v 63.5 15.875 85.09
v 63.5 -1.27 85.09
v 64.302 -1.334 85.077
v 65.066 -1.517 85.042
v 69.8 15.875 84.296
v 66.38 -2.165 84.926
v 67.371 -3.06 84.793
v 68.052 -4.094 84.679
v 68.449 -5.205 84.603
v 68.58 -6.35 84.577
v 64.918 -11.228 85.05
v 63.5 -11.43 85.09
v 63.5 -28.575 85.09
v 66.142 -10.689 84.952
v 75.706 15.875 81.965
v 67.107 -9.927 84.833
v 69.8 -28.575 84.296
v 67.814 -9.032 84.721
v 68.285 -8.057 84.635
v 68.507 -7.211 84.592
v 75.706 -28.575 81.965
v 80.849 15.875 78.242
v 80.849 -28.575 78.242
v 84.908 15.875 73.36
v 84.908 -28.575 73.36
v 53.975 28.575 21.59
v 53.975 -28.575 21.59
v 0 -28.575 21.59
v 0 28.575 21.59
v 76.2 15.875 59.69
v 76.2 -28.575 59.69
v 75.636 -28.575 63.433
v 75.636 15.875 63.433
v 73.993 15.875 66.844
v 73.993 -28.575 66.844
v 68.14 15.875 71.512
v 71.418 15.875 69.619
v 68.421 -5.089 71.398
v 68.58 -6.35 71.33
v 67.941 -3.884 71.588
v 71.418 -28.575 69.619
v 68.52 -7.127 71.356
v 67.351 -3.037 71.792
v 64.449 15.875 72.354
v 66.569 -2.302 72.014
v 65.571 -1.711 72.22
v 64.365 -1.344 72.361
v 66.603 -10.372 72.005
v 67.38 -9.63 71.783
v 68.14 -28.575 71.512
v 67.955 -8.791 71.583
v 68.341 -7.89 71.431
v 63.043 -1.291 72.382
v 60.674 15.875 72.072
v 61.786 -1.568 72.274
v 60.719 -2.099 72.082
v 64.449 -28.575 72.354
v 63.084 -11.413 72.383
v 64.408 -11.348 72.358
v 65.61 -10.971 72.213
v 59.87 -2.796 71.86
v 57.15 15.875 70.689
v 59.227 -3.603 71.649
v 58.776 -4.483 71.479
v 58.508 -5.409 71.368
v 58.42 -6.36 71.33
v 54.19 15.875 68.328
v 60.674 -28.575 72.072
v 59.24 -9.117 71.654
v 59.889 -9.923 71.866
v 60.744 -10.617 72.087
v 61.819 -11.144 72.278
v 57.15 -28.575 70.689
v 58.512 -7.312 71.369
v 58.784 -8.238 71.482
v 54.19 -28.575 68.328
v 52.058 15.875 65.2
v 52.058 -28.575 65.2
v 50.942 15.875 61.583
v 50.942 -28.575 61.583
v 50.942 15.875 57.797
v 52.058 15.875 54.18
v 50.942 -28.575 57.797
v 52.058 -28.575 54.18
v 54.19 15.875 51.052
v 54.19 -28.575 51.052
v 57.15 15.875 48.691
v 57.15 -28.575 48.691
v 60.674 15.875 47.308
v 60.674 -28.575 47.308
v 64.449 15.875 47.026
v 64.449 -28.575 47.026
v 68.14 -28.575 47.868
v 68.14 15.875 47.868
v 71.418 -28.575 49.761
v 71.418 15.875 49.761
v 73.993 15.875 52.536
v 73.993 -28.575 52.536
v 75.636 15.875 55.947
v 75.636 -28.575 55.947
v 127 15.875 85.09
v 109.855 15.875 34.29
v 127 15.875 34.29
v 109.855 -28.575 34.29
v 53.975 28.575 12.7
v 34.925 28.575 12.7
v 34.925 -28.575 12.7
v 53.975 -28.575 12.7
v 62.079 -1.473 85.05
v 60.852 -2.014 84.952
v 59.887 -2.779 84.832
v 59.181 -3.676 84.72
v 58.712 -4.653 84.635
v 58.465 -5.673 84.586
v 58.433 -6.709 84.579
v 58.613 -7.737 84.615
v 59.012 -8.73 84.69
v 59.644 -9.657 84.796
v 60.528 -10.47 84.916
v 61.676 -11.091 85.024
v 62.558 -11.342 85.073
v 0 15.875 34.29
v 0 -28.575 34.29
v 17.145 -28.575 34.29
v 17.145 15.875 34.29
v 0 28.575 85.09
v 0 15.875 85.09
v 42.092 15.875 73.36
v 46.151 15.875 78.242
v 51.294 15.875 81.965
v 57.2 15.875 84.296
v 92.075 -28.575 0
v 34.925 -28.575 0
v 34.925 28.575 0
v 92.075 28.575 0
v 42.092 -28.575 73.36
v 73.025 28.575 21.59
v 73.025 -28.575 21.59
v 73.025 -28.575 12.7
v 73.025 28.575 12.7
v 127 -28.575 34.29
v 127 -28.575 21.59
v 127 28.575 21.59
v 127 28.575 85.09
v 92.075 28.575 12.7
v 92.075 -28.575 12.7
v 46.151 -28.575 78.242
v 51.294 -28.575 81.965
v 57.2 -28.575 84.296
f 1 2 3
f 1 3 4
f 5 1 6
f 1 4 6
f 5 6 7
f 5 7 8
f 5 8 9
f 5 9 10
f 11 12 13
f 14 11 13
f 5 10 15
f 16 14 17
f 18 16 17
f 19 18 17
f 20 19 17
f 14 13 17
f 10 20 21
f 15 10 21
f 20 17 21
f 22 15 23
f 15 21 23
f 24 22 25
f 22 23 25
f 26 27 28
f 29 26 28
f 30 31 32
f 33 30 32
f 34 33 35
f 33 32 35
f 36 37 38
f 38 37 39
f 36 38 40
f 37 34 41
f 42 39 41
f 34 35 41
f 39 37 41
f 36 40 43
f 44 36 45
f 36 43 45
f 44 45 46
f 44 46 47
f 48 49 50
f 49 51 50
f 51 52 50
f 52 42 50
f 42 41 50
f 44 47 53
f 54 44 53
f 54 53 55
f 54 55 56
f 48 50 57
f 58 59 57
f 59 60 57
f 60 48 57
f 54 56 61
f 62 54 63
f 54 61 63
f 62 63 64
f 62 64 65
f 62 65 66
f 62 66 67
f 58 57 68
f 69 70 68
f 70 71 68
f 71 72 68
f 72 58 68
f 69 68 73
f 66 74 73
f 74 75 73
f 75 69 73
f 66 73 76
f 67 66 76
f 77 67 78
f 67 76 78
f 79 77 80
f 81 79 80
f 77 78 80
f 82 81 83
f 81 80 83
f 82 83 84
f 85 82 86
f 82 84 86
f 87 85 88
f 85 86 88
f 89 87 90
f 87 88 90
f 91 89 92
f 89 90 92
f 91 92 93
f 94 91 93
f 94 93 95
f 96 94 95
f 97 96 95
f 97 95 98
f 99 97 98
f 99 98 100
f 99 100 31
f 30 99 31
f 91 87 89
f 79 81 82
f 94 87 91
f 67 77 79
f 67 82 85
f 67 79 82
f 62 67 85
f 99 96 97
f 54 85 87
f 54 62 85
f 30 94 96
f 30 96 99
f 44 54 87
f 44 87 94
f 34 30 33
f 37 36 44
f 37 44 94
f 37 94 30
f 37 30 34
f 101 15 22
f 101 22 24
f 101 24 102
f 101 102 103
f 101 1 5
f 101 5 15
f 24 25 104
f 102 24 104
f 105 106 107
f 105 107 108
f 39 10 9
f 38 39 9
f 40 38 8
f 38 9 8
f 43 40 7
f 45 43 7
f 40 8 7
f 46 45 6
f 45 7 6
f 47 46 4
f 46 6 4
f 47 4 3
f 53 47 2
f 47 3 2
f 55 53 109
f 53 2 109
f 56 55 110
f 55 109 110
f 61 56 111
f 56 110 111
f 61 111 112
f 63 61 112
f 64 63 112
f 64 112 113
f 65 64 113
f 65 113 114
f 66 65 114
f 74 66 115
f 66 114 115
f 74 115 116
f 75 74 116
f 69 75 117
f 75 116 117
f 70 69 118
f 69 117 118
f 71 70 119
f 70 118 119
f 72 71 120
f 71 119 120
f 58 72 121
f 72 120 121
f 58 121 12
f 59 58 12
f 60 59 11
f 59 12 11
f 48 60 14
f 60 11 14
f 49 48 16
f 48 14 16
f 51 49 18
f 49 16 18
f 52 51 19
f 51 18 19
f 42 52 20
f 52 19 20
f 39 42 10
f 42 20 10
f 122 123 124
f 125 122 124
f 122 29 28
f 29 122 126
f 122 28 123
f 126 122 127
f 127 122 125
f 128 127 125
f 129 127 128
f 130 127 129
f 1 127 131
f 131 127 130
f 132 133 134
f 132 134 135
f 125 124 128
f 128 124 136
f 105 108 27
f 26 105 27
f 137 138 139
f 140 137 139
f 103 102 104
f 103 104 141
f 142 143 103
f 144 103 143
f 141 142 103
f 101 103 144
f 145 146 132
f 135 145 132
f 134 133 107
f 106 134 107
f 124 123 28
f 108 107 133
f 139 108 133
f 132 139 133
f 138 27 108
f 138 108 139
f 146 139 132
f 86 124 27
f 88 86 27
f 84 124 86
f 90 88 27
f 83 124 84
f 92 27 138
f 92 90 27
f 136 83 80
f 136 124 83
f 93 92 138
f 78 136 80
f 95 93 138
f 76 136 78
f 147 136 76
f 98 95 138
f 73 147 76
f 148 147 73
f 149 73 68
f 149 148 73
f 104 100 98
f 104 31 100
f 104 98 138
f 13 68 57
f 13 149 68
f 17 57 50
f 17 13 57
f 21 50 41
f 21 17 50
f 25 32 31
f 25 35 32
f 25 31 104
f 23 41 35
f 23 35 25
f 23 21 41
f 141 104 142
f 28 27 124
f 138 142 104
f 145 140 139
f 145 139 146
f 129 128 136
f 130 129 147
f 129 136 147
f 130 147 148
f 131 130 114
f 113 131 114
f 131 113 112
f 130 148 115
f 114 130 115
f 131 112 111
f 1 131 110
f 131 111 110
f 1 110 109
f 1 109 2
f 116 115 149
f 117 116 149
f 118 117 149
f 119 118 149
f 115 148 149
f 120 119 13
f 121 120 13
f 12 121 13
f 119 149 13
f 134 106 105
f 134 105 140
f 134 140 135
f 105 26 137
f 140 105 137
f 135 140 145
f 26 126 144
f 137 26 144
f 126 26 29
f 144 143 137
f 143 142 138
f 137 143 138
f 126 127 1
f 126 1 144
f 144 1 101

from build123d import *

# Parameters (mm, degrees)
F0_W     = 127
F0_H     = 85.09
F1_DEPTH = 28.575
F3_DEPTH = 57.151
F5_R     = 5.08
F6_DEPTH = 25.4
F4_R     = 12.7
F7_DEPTH = 44.45


with BuildPart() as f1:
    # F0 (on Front) → F1 (new body, symmetric)
    with BuildSketch(Plane.XZ):
        with Locations((63.5, 42.545)):
            Rectangle(F0_W, F0_H)
    extrude(amount=F1_DEPTH, both=True)

    # F2 (on face) → F3 (cut, through all)
    with BuildSketch(Plane.XZ.offset(28.575)):
        Polygon((0, 0), (34.925, 0), (34.925, 12.7), (53.975, 12.7), (53.975, 21.59), (0, 21.59), align=None)
        Polygon((92.075, 12.7), (92.075, 0), (127, 0), (127, 21.59), (73.025, 21.59), (73.025, 12.7), align=None)
    extrude(amount=-F3_DEPTH, mode=Mode.SUBTRACT)

    # F5 (on face) → F6 (cut)
    with BuildSketch(Plane.XY.offset(85.09)):
        with Locations((63.5, -6.35)):
            Circle(F5_R)
    extrude(amount=-F6_DEPTH, mode=Mode.SUBTRACT)

    # F4 (on face) → F7 (cut)
    with BuildSketch(Plane.XZ.offset(28.575)):
        with Locations((63.5, 59.69)):
            Circle(F4_R)
        with BuildLine():
            Line((0, 85.09), (0, 34.29))
            Line((0, 34.29), (17.145, 34.29))
            Line((17.145, 34.29), (42.092005, 73.359592))
            ThreePointArc((42.092005, 73.359592), (51.29442, 81.965184), (63.5, 85.09))
            Line((63.5, 85.09), (0, 85.09))
        make_face()
        with BuildLine():
            Line((127, 85.09), (63.5, 85.09))
            ThreePointArc((63.5, 85.09), (75.70558, 81.965184), (84.907995, 73.359592))
            Line((84.907995, 73.359592), (109.855, 34.29))
            Line((109.855, 34.29), (127, 34.29))
            Line((127, 34.29), (127, 85.09))
        make_face()
    extrude(amount=-F7_DEPTH, mode=Mode.SUBTRACT)


solid = f1.part
